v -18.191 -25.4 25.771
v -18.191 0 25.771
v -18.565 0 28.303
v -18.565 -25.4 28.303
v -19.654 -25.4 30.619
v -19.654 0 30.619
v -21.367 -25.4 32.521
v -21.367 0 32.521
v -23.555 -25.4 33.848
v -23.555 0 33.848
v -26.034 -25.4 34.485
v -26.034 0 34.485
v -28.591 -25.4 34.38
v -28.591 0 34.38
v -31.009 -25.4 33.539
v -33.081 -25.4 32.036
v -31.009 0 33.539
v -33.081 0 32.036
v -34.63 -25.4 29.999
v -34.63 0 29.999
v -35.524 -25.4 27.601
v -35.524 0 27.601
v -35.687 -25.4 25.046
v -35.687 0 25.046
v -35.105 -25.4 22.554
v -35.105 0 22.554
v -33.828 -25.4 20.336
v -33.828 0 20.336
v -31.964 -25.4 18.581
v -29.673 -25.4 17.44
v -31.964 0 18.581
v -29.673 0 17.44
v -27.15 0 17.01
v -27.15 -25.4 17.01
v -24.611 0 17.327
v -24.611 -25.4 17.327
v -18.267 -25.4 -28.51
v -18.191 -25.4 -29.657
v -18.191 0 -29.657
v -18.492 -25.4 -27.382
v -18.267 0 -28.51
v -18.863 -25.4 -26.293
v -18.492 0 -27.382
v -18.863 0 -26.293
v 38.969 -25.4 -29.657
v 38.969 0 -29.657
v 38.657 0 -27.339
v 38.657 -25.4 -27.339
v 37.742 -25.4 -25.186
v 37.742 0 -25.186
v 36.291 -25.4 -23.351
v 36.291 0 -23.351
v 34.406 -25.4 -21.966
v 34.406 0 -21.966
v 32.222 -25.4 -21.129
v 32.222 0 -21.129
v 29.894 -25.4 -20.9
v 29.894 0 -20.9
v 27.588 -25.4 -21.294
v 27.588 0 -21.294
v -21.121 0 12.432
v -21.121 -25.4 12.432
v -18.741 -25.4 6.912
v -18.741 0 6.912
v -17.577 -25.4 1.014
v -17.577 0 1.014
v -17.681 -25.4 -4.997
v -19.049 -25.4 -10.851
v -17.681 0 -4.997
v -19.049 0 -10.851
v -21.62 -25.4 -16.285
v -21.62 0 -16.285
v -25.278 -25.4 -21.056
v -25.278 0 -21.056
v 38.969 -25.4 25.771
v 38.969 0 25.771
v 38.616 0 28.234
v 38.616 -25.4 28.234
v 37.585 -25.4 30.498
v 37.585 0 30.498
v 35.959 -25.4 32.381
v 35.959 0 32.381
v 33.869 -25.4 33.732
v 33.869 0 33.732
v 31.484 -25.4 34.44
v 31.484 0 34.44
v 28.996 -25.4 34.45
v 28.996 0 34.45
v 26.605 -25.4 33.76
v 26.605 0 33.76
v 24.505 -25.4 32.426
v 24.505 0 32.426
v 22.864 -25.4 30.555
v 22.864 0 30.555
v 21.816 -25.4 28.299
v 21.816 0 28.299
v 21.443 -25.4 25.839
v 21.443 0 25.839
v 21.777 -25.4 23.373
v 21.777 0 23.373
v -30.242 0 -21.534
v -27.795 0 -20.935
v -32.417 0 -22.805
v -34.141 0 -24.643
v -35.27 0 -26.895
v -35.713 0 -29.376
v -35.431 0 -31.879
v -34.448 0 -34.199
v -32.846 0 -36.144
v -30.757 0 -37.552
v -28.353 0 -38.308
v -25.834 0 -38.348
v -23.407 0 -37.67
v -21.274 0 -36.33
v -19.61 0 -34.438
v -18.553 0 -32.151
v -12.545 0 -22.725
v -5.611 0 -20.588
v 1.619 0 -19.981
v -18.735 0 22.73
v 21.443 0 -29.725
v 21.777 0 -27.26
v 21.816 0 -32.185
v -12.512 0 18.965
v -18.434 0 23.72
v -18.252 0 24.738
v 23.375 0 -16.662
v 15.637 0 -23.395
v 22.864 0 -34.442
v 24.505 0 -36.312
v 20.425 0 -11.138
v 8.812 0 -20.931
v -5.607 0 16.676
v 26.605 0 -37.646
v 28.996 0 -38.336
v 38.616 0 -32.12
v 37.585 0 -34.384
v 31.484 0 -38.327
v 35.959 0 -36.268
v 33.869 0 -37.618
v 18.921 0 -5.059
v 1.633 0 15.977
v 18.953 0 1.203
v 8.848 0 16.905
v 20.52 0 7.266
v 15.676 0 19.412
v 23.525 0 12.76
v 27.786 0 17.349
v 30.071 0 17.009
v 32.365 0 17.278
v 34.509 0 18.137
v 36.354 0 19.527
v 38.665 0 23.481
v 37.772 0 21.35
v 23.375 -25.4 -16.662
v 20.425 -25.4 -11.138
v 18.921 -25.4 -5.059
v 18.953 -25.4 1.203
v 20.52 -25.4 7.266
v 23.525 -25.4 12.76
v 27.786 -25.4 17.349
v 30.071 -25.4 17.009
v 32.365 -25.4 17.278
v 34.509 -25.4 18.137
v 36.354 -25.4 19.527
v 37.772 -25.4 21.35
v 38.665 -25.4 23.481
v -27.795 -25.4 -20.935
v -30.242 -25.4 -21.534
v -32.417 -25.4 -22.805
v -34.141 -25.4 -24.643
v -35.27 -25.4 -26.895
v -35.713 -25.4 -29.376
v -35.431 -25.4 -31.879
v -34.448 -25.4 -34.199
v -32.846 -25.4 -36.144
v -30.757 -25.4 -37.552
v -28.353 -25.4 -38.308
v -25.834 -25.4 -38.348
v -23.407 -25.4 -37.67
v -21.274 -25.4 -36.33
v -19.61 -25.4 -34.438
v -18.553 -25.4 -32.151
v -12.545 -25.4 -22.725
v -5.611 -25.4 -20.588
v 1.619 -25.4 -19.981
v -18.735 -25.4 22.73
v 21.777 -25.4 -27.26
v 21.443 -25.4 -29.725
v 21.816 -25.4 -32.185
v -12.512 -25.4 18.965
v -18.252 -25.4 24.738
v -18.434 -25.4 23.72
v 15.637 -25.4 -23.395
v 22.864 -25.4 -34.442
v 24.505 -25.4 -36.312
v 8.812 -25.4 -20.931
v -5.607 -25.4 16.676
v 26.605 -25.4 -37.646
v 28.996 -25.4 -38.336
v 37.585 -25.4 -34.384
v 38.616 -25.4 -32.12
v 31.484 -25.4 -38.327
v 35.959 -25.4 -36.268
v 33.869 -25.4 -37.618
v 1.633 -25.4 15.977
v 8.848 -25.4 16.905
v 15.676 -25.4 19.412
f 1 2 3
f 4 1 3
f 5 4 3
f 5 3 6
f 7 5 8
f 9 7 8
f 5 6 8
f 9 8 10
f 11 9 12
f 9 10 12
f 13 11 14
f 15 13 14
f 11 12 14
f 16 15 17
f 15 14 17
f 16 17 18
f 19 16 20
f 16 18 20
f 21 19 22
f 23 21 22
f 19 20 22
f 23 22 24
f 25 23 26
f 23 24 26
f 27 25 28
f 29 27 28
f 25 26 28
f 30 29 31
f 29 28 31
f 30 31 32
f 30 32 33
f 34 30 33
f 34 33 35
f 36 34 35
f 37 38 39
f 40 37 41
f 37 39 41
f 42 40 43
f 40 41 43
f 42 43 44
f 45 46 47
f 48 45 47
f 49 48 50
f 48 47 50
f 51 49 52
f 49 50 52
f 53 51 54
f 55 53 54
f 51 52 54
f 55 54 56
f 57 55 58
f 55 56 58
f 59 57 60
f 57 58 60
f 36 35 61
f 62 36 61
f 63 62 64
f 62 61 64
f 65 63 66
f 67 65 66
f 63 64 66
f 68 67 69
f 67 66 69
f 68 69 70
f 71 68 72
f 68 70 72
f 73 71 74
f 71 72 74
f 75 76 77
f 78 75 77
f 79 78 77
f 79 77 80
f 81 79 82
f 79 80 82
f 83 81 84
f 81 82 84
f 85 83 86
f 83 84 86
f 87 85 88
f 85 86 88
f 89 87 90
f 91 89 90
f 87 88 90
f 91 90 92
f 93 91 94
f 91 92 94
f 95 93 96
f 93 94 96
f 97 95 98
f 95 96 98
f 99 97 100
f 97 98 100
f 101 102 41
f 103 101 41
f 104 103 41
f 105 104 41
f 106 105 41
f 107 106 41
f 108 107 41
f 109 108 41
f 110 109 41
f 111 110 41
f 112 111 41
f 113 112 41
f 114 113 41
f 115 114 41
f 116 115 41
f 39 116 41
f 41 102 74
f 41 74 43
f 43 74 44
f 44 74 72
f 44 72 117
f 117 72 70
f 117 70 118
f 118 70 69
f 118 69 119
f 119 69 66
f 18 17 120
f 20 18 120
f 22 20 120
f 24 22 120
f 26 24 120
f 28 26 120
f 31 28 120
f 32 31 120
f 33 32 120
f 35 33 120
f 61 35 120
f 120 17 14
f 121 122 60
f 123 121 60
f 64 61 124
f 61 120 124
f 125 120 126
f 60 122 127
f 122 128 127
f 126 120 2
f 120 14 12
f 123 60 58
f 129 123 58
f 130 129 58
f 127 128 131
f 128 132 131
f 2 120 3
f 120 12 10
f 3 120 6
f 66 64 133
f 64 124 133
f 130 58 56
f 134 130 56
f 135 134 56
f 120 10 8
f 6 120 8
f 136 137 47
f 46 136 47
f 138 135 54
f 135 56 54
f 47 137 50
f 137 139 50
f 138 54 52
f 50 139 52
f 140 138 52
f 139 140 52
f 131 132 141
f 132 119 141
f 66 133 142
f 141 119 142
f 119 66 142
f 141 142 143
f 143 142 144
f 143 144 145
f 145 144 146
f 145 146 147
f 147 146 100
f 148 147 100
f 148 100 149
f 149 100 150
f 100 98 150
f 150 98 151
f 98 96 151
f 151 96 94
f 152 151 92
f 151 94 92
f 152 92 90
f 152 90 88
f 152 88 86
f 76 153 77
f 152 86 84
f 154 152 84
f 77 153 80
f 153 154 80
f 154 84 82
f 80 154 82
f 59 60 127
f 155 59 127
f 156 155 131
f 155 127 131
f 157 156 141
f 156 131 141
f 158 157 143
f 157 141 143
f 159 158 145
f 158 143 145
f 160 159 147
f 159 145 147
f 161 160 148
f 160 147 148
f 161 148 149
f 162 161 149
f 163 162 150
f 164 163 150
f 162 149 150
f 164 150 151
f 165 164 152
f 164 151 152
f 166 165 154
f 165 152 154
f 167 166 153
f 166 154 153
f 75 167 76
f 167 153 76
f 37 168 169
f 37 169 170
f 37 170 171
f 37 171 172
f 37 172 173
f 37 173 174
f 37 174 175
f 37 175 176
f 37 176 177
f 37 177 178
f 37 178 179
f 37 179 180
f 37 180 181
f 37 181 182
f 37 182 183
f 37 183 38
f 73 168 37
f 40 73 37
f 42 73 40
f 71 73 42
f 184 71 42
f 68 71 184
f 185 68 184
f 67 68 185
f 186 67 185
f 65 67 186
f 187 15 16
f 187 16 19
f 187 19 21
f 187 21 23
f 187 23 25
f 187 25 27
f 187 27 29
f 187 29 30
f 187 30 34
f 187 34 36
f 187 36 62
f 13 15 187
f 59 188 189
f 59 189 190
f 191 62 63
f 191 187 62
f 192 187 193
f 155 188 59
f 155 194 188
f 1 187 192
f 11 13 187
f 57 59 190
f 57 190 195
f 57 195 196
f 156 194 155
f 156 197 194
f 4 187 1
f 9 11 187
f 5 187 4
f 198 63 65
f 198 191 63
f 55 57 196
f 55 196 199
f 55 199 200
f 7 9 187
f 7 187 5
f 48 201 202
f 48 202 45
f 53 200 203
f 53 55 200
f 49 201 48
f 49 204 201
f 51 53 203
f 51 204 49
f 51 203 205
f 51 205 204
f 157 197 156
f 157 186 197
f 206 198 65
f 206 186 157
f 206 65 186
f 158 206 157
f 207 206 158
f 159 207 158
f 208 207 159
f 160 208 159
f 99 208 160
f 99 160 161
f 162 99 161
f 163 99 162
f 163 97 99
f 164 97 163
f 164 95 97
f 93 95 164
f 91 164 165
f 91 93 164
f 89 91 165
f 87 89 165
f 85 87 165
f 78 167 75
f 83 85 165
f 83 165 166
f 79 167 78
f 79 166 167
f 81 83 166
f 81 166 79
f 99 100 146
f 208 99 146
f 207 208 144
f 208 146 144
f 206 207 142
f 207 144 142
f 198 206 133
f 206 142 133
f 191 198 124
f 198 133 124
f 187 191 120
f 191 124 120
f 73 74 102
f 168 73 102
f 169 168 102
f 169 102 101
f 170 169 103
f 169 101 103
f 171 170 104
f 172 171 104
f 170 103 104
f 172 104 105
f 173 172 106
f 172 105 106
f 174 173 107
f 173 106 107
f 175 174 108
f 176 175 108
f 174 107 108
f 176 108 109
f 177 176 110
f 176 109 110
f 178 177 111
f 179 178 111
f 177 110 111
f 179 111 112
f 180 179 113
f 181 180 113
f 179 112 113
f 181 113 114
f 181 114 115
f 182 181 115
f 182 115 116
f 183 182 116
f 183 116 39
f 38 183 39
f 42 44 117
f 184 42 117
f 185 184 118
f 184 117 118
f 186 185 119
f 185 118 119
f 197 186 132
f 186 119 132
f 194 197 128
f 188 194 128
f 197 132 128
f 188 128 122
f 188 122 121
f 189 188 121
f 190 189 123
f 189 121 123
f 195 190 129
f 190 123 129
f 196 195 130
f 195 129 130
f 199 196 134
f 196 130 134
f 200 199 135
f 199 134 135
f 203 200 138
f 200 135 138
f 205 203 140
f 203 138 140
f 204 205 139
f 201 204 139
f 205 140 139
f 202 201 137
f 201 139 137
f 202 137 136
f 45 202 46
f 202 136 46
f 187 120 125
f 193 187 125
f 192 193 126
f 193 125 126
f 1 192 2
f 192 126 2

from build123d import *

# Parameters (mm, degrees)
F1_DEPTH = 25.4


with BuildPart() as f1:
    # F0 (on Front) → F1 (new body)
    with BuildSketch(Plane.XZ):
        with BuildLine():
            ThreePointArc((-18.735469, 22.730416), (-18.328265, 24.226462), (-18.1911, 25.770856))
            ThreePointArc((-18.1911, 25.770856), (-33.93, 31.074343), (-24.610585, 17.327035))
            ThreePointArc((-24.610585, 17.327035), (-21.02208, 19.320948), (-18.735469, 22.730416))
        make_face()
        with BuildLine():
            ThreePointArc((-18.735469, 22.730416), (-21.02208, 19.320948), (-24.610585, 17.327035))
            ThreePointArc((-24.610585, 17.327035), (-17.469276, -1.99445), (-25.278004, -21.055977))
            ThreePointArc((-25.278004, -21.055977), (-21.412607, -22.868816), (-18.862593, -26.293012))
            ThreePointArc((-18.862593, -26.293012), (1.619037, -19.980616), (21.777358, -27.259737))
            ThreePointArc((21.777358, -27.259737), (23.928897, -23.542629), (27.588285, -21.294319))
            ThreePointArc((27.588285, -21.294319), (18.742727, -1.927072), (27.78602, 17.348638))
            ThreePointArc((27.78602, 17.348638), (24.00136, 19.582777), (21.777358, 23.373403))
            ThreePointArc((21.777358, 23.373403), (1.633225, 15.977432), (-18.735469, 22.730416))
        make_face()
        with BuildLine():
            ThreePointArc((-18.862593, -26.293012), (-21.412607, -22.868816), (-25.278004, -21.055977))
            ThreePointArc((-25.278004, -21.055977), (-33.717153, -35.229558), (-18.1911, -29.657191))
            ThreePointArc((-18.1911, -29.657191), (-18.360613, -27.941921), (-18.862593, -26.293012))
        make_face()
        with BuildLine():
            ThreePointArc((38.969023, 25.770856), (28.995696, 34.44987), (21.777358, 23.373403))
            ThreePointArc((21.777358, 23.373403), (24.00136, 19.582777), (27.78602, 17.348638))
            ThreePointArc((27.78602, 17.348638), (35.47782, 18.770976), (38.969023, 25.770856))
        make_face()
        with BuildLine():
            ThreePointArc((27.588285, -21.294319), (23.928897, -23.542629), (21.777358, -27.259737))
            ThreePointArc((21.777358, -27.259737), (28.995696, -38.336204), (38.969023, -29.657191))
            ThreePointArc((38.969023, -29.657191), (35.394998, -22.595696), (27.588285, -21.294319))
        make_face()
    extrude(amount=F1_DEPTH)


solid = f1.part
